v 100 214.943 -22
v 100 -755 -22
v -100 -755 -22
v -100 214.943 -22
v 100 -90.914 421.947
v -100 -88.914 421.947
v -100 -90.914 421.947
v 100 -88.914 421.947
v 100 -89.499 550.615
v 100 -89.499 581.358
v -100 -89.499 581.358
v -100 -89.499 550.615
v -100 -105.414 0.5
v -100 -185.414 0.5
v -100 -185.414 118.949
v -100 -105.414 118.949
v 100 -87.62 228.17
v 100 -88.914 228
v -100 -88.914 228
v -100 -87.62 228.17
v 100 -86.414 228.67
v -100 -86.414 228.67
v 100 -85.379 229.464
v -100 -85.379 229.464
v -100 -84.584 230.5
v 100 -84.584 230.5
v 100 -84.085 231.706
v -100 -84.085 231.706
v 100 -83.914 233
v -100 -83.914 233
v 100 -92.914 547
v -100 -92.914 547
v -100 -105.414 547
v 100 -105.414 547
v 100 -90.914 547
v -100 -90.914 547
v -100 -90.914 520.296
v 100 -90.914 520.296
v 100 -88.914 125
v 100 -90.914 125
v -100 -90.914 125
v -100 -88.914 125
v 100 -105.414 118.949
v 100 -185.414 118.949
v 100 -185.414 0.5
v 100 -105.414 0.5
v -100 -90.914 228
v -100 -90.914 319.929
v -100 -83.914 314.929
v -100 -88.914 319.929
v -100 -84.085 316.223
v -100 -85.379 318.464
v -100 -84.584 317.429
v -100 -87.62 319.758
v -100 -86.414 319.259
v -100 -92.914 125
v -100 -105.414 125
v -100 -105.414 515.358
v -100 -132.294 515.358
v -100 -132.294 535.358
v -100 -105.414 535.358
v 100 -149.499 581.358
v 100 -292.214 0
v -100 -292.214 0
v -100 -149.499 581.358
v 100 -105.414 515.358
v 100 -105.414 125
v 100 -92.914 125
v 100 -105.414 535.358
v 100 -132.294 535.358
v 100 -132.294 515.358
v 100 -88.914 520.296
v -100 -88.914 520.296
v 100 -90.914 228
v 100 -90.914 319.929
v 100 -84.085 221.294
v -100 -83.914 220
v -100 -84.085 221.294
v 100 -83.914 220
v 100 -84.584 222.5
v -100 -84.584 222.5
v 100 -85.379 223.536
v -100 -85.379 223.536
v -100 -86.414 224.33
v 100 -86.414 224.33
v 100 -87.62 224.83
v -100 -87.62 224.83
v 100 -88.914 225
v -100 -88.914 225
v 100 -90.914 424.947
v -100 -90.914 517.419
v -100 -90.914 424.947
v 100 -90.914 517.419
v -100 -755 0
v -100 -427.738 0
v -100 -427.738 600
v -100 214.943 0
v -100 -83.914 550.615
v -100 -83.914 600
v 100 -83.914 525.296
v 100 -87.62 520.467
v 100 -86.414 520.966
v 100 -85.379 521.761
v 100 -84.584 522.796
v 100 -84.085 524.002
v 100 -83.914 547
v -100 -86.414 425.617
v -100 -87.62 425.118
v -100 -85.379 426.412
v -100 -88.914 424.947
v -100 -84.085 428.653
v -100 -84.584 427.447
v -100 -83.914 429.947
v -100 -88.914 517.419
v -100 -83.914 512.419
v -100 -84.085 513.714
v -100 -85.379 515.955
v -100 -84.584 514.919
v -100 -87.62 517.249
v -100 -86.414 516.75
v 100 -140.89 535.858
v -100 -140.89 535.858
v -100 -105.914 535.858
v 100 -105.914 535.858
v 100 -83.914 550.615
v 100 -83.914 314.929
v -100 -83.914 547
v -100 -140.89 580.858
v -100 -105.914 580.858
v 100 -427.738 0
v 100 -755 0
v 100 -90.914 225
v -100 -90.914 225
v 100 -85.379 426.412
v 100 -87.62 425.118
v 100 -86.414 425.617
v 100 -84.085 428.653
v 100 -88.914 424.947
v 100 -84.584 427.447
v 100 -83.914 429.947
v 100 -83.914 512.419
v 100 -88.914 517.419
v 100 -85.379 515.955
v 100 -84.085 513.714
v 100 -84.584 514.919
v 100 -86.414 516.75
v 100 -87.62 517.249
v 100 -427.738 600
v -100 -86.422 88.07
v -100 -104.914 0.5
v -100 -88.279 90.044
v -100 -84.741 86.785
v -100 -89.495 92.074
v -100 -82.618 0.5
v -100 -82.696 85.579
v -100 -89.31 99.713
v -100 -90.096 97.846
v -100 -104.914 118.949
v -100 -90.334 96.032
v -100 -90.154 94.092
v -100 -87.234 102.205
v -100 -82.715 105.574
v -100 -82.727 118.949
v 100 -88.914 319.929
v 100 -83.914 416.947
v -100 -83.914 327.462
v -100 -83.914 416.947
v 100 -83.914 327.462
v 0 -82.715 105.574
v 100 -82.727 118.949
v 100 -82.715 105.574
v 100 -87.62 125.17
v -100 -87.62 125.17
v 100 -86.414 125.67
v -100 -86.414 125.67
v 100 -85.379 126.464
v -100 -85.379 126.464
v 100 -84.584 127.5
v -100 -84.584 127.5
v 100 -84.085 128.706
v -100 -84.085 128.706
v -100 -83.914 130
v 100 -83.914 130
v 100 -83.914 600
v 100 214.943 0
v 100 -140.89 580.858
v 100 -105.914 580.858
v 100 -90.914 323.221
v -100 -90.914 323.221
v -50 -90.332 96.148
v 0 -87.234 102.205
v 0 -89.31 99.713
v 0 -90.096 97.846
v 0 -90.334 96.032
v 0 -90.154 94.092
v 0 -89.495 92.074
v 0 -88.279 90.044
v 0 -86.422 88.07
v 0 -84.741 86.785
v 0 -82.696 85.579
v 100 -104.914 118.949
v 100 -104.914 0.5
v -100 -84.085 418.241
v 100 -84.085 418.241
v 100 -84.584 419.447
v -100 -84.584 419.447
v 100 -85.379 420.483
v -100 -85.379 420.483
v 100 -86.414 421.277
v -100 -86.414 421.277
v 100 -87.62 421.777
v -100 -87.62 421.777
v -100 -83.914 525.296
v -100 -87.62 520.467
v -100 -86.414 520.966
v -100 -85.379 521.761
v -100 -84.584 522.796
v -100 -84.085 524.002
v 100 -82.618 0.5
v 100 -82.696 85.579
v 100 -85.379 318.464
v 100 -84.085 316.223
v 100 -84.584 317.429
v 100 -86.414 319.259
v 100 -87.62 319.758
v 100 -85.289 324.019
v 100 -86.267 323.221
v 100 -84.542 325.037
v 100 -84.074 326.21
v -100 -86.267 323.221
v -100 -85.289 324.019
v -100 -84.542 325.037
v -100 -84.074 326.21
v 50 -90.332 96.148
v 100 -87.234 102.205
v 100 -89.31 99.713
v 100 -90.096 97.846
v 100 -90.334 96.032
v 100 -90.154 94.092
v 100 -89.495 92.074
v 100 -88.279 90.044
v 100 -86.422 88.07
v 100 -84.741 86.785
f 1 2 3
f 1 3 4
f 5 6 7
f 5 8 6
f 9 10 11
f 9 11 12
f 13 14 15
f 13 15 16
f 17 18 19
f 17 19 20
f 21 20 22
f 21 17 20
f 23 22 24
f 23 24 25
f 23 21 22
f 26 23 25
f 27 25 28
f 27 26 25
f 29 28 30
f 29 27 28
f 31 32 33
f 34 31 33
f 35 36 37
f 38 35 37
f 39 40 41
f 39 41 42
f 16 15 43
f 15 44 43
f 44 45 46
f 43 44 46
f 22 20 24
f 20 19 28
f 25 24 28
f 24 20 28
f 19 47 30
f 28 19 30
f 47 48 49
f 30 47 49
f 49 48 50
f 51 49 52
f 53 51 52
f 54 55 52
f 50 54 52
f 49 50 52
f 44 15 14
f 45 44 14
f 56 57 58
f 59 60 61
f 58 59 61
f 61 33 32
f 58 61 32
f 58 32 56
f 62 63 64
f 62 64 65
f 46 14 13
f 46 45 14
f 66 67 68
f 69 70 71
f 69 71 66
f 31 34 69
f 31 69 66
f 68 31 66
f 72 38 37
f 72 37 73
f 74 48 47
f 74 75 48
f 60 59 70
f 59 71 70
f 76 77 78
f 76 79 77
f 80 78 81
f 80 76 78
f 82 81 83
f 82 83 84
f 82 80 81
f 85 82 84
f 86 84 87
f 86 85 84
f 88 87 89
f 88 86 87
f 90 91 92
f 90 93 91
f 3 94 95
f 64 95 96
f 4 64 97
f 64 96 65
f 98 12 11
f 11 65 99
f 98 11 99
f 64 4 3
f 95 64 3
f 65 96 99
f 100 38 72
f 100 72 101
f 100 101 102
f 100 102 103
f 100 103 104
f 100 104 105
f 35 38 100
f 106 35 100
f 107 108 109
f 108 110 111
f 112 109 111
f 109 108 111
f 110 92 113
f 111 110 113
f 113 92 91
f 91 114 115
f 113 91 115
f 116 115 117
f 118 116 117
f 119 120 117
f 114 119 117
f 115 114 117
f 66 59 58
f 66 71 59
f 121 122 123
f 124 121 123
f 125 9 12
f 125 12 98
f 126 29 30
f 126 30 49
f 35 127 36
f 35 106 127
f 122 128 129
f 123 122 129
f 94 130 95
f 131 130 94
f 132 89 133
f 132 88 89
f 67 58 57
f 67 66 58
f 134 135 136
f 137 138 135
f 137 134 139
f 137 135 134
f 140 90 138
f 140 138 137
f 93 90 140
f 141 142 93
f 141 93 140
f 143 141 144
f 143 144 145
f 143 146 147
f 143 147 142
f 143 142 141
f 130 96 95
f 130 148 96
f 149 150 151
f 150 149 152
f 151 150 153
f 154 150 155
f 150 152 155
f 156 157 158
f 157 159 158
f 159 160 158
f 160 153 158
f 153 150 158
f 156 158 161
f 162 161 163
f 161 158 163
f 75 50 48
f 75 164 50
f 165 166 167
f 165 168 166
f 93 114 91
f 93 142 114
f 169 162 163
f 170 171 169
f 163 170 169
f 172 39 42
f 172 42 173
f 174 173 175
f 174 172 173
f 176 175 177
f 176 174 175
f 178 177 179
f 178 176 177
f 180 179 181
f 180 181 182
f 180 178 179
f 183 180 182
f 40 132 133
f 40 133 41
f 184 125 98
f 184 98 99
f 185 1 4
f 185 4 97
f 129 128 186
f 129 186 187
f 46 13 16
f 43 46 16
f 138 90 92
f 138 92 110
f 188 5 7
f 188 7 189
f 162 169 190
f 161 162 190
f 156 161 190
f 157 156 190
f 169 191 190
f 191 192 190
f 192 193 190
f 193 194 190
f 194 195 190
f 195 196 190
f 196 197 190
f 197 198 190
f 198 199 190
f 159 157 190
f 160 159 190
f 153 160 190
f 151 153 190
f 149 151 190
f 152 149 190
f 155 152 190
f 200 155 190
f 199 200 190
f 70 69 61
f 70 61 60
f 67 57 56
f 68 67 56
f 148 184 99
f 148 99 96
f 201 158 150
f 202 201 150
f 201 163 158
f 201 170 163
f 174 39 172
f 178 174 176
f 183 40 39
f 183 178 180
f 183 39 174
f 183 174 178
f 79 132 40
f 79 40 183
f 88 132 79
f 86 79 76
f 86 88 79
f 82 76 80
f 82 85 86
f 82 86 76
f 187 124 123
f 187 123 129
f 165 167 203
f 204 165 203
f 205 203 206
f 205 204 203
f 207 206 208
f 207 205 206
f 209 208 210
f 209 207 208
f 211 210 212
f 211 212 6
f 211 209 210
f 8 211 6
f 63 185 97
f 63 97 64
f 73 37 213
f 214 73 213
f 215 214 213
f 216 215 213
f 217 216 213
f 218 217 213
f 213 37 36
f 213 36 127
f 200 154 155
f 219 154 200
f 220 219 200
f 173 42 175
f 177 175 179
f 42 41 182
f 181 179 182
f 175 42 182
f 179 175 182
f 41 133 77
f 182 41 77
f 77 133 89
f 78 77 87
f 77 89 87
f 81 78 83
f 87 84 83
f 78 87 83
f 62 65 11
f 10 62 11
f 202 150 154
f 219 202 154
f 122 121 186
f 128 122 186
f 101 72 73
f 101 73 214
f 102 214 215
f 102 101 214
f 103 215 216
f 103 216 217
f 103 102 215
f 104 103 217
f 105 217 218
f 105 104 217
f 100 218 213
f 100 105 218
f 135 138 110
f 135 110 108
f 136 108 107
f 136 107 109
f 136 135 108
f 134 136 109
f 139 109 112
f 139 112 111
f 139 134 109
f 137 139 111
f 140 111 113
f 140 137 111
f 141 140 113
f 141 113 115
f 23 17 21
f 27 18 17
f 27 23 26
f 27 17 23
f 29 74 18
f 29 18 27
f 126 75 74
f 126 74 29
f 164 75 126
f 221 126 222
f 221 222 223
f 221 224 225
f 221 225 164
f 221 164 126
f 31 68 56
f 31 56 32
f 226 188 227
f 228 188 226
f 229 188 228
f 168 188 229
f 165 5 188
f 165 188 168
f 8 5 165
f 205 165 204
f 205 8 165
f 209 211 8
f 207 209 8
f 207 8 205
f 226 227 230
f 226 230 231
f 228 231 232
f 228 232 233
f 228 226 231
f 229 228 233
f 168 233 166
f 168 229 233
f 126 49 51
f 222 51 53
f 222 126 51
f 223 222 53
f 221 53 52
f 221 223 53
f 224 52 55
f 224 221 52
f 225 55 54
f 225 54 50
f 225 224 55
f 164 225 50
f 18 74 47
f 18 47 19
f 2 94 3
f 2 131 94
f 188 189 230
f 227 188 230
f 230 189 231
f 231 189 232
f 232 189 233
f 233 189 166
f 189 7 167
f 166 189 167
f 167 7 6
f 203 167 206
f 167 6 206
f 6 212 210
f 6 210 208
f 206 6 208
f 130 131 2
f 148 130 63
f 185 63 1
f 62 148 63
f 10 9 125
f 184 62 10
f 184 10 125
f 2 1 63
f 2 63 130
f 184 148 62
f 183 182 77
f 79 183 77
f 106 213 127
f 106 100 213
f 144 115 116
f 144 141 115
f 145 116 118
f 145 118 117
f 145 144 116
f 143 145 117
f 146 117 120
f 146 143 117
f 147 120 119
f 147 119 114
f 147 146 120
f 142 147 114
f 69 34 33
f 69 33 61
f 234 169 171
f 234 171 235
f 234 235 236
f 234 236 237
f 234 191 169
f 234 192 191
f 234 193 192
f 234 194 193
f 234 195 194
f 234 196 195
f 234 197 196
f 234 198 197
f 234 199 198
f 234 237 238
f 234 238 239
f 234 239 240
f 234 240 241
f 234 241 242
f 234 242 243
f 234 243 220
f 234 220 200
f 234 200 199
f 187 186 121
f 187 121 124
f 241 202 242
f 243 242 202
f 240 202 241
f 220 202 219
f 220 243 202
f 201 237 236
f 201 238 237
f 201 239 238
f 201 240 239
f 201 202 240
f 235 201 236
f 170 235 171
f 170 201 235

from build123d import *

# Parameters (mm, degrees)
F1_DEPTH      = 100
F1_DEPTH_BACK = 100
F0_W          = 34.9759974469
F0_H          = 45
F0_W_2        = 80
F0_H_2        = 39.9999883202
F0_H_3        = 39.5000116798
F0_H_4        = 38.9489678172
F0_W_3        = 23.8797763255
F0_H_5        = 20


with BuildPart() as f1:
    # F0 (on Right) → F1 (new body, two sides)
    with BuildSketch(Plane.YZ) as f1_sk:
        Polygon((-427.7376234531, 0), (-754.9997070302, 0), (-754.9997070302, -22), (214.9425135471, -22), (214.9425135471, 0), (-292.2143008412, 0), align=None)
        Polygon((-427.7376234531, 600), (-427.7376234531, 0), (-292.2143008412, 0), (-149.4990265369, 581.3576579094), (-89.4990265369, 581.3576579094), (-89.4990265369, 550.6148771089), (-83.9142134201, 550.6148771089), (-83.9142134201, 600), align=None)
    extrude(amount=F1_DEPTH)
    extrude(f1_sk.sketch, amount=-F1_DEPTH_BACK)


with BuildPart() as f1b:
    # F0 (on Right) → F1, piece 2 (new body, two sides)
    with BuildSketch(Plane.YZ) as f1_2_sk:
        with Locations((-123.4022121435, 558.3576579094)):
            Rectangle(F0_W, F0_H)
    extrude(amount=F1_DEPTH)
    extrude(f1_2_sk.sketch, amount=-F1_DEPTH_BACK)


with BuildPart() as f1c:
    # F0 (on Right) → F1, piece 3 (new body, two sides)
    with BuildSketch(Plane.YZ) as f1_3_sk:
        with Locations((-145.4142134201, 60.0000058399)):
            Rectangle(F0_W_2, F0_H_2)
        with Locations((-145.4142134201, 20.2500058399)):
            Rectangle(F0_W_2, F0_H_3)
        with Locations((-145.4142134201, 99.4744839086)):
            Rectangle(F0_W_2, F0_H_4)
    extrude(amount=F1_DEPTH)
    extrude(f1_3_sk.sketch, amount=-F1_DEPTH_BACK)


with BuildPart() as f1d:
    # F0 (on Right) → F1, piece 4 (new body, two sides)
    with BuildSketch(Plane.YZ) as f1_4_sk:
        with BuildLine():
            Line((-104.9142134201, 0.5), (-82.6184755082, 0.5))
            Line((-82.6184755082, 0.5), (-82.6962319007, 85.5785166937))
            add(Edge.make_bspline(
                [(-82.7145062746, 105.5737424313), (-88.3483122438, 101.991181286), (-92.1908083791, 96.734138044), (-88.6080723378, 88.645690703), (-82.6962319007, 85.5785166937)],
                knots=[0, 0, 0, 0, 0.4908509799, 1, 1, 1, 1], degree=3))
            Line((-82.7145062746, 105.5737424313), (-82.7267303861, 118.9489678172))
            Line((-82.7267303861, 118.9489678172), (-104.9142134201, 118.9489678172))
            Line((-104.9142134201, 118.9489678172), (-104.9142134201, 0.5))
        make_face()
    extrude(amount=F1_DEPTH)
    extrude(f1_4_sk.sketch, amount=-F1_DEPTH_BACK)


with BuildPart() as f1e:
    # F0 (on Right) → F1, piece 5 (new body, two sides)
    with BuildSketch(Plane.YZ) as f1_5_sk:
        Polygon((-105.4142134201, 515.3576579094), (-105.4142134201, 125), (-92.9142134201, 125), (-92.9142134201, 547), (-105.4142134201, 547), (-105.4142134201, 535.3576579094), align=None)
        Polygon((-107.2939897456, 515.3576579094), (-105.4142134201, 515.3576579094), (-105.4142134201, 535.3576579094), (-107.1194523898, 535.3576579094), align=None)
        Polygon((-108.4142134201, 515.3576579094), (-107.2939897456, 515.3576579094), (-107.1194523898, 535.3576579094), (-108.4142134201, 535.3576579094), align=None)
        with Locations((-120.3541015828, 525.3576579094)):
            Rectangle(F0_W_3, F0_H_5)
    extrude(amount=F1_DEPTH)
    extrude(f1_5_sk.sketch, amount=-F1_DEPTH_BACK)


with BuildPart() as f1f:
    # F0 (on Right) → F1, piece 6 (new body, two sides)
    with BuildSketch(Plane.YZ) as f1_6_sk:
        with BuildLine():
            Line((-88.9142134201, 225), (-90.9142134201, 225))
            Line((-90.9142134201, 225), (-90.9142134201, 125))
            Line((-90.9142134201, 125), (-88.9142134201, 125))
            ThreePointArc((-88.9142134201, 125), (-85.3786795141, 126.4644660941), (-83.9142134201, 130))
            Line((-83.9142134201, 130), (-83.9142134201, 220))
            ThreePointArc((-83.9142134201, 220), (-85.3786795141, 223.5355339059), (-88.9142134201, 225))
        make_face()
    extrude(amount=F1_DEPTH)
    extrude(f1_6_sk.sketch, amount=-F1_DEPTH_BACK)


with BuildPart() as f1g:
    # F0 (on Right) → F1, piece 7 (new body, two sides)
    with BuildSketch(Plane.YZ) as f1_7_sk:
        with BuildLine():
            Line((-90.9142134201, 319.9287502766), (-90.9142134201, 228))
            Line((-90.9142134201, 228), (-88.9142134201, 228))
            ThreePointArc((-88.9142134201, 228), (-85.3786795141, 229.4644660941), (-83.9142134201, 233))
            Line((-83.9142134201, 233), (-83.9142134201, 314.9287502766))
            ThreePointArc((-83.9142134201, 314.9287502766), (-85.3786795141, 318.4642841825), (-88.9142134201, 319.9287502766))
            Line((-88.9142134201, 319.9287502766), (-90.9142134201, 319.9287502766))
        make_face()
    extrude(amount=F1_DEPTH)
    extrude(f1_7_sk.sketch, amount=-F1_DEPTH_BACK)


with BuildPart() as f1h:
    # F0 (on Right) → F1, piece 8 (new body, two sides)
    with BuildSketch(Plane.YZ) as f1_8_sk:
        with BuildLine():
            Line((-88.9142134201, 421.9472338968), (-90.9142134201, 421.9472338968))
            Line((-90.9142134201, 421.9472338968), (-90.9142134201, 323.2205915266))
            Line((-90.9142134201, 323.2205915266), (-86.2669326212, 323.2205915266))
            ThreePointArc((-86.2669326212, 323.2205915266), (-84.5417767999, 325.0370361833), (-83.9142134201, 327.4622780275))
            Line((-83.9142134201, 327.4622780275), (-83.9142134201, 416.9472338968))
            ThreePointArc((-83.9142134201, 416.9472338968), (-85.3786795141, 420.4827678027), (-88.9142134201, 421.9472338968))
        make_face()
    extrude(amount=F1_DEPTH)
    extrude(f1_8_sk.sketch, amount=-F1_DEPTH_BACK)


with BuildPart() as f1i:
    # F0 (on Right) → F1, piece 9 (new body, two sides)
    with BuildSketch(Plane.YZ) as f1_9_sk:
        with BuildLine():
            Line((-90.9142134201, 517.4194891267), (-90.9142134201, 424.9472338968))
            Line((-90.9142134201, 424.9472338968), (-88.9142134201, 424.9472338968))
            ThreePointArc((-88.9142134201, 424.9472338968), (-85.3786795141, 426.4116999908), (-83.9142134201, 429.9472338968))
            Line((-83.9142134201, 429.9472338968), (-83.9142134201, 512.4194891267))
            ThreePointArc((-83.9142134201, 512.4194891267), (-85.3786795141, 515.9550230327), (-88.9142134201, 517.4194891267))
            Line((-88.9142134201, 517.4194891267), (-90.9142134201, 517.4194891267))
        make_face()
    extrude(amount=F1_DEPTH)
    extrude(f1_9_sk.sketch, amount=-F1_DEPTH_BACK)


with BuildPart() as f1j:
    # F0 (on Right) → F1, piece 10 (new body, two sides)
    with BuildSketch(Plane.YZ) as f1_10_sk:
        with BuildLine():
            Line((-90.9142134201, 547), (-90.9142134201, 520.2964544296))
            Line((-90.9142134201, 520.2964544296), (-88.9142134201, 520.2964544296))
            ThreePointArc((-88.9142134201, 520.2964544296), (-85.3786795141, 521.7609205237), (-83.9142134201, 525.2964544296))
            Line((-83.9142134201, 525.2964544296), (-83.9142134201, 547))
            Line((-83.9142134201, 547), (-90.9142134201, 547))
        make_face()
    extrude(amount=F1_DEPTH)
    extrude(f1_10_sk.sketch, amount=-F1_DEPTH_BACK)


solid = Compound([f1.part, f1b.part, f1c.part, f1d.part, f1e.part, f1f.part, f1g.part, f1h.part, f1i.part, f1j.part])
